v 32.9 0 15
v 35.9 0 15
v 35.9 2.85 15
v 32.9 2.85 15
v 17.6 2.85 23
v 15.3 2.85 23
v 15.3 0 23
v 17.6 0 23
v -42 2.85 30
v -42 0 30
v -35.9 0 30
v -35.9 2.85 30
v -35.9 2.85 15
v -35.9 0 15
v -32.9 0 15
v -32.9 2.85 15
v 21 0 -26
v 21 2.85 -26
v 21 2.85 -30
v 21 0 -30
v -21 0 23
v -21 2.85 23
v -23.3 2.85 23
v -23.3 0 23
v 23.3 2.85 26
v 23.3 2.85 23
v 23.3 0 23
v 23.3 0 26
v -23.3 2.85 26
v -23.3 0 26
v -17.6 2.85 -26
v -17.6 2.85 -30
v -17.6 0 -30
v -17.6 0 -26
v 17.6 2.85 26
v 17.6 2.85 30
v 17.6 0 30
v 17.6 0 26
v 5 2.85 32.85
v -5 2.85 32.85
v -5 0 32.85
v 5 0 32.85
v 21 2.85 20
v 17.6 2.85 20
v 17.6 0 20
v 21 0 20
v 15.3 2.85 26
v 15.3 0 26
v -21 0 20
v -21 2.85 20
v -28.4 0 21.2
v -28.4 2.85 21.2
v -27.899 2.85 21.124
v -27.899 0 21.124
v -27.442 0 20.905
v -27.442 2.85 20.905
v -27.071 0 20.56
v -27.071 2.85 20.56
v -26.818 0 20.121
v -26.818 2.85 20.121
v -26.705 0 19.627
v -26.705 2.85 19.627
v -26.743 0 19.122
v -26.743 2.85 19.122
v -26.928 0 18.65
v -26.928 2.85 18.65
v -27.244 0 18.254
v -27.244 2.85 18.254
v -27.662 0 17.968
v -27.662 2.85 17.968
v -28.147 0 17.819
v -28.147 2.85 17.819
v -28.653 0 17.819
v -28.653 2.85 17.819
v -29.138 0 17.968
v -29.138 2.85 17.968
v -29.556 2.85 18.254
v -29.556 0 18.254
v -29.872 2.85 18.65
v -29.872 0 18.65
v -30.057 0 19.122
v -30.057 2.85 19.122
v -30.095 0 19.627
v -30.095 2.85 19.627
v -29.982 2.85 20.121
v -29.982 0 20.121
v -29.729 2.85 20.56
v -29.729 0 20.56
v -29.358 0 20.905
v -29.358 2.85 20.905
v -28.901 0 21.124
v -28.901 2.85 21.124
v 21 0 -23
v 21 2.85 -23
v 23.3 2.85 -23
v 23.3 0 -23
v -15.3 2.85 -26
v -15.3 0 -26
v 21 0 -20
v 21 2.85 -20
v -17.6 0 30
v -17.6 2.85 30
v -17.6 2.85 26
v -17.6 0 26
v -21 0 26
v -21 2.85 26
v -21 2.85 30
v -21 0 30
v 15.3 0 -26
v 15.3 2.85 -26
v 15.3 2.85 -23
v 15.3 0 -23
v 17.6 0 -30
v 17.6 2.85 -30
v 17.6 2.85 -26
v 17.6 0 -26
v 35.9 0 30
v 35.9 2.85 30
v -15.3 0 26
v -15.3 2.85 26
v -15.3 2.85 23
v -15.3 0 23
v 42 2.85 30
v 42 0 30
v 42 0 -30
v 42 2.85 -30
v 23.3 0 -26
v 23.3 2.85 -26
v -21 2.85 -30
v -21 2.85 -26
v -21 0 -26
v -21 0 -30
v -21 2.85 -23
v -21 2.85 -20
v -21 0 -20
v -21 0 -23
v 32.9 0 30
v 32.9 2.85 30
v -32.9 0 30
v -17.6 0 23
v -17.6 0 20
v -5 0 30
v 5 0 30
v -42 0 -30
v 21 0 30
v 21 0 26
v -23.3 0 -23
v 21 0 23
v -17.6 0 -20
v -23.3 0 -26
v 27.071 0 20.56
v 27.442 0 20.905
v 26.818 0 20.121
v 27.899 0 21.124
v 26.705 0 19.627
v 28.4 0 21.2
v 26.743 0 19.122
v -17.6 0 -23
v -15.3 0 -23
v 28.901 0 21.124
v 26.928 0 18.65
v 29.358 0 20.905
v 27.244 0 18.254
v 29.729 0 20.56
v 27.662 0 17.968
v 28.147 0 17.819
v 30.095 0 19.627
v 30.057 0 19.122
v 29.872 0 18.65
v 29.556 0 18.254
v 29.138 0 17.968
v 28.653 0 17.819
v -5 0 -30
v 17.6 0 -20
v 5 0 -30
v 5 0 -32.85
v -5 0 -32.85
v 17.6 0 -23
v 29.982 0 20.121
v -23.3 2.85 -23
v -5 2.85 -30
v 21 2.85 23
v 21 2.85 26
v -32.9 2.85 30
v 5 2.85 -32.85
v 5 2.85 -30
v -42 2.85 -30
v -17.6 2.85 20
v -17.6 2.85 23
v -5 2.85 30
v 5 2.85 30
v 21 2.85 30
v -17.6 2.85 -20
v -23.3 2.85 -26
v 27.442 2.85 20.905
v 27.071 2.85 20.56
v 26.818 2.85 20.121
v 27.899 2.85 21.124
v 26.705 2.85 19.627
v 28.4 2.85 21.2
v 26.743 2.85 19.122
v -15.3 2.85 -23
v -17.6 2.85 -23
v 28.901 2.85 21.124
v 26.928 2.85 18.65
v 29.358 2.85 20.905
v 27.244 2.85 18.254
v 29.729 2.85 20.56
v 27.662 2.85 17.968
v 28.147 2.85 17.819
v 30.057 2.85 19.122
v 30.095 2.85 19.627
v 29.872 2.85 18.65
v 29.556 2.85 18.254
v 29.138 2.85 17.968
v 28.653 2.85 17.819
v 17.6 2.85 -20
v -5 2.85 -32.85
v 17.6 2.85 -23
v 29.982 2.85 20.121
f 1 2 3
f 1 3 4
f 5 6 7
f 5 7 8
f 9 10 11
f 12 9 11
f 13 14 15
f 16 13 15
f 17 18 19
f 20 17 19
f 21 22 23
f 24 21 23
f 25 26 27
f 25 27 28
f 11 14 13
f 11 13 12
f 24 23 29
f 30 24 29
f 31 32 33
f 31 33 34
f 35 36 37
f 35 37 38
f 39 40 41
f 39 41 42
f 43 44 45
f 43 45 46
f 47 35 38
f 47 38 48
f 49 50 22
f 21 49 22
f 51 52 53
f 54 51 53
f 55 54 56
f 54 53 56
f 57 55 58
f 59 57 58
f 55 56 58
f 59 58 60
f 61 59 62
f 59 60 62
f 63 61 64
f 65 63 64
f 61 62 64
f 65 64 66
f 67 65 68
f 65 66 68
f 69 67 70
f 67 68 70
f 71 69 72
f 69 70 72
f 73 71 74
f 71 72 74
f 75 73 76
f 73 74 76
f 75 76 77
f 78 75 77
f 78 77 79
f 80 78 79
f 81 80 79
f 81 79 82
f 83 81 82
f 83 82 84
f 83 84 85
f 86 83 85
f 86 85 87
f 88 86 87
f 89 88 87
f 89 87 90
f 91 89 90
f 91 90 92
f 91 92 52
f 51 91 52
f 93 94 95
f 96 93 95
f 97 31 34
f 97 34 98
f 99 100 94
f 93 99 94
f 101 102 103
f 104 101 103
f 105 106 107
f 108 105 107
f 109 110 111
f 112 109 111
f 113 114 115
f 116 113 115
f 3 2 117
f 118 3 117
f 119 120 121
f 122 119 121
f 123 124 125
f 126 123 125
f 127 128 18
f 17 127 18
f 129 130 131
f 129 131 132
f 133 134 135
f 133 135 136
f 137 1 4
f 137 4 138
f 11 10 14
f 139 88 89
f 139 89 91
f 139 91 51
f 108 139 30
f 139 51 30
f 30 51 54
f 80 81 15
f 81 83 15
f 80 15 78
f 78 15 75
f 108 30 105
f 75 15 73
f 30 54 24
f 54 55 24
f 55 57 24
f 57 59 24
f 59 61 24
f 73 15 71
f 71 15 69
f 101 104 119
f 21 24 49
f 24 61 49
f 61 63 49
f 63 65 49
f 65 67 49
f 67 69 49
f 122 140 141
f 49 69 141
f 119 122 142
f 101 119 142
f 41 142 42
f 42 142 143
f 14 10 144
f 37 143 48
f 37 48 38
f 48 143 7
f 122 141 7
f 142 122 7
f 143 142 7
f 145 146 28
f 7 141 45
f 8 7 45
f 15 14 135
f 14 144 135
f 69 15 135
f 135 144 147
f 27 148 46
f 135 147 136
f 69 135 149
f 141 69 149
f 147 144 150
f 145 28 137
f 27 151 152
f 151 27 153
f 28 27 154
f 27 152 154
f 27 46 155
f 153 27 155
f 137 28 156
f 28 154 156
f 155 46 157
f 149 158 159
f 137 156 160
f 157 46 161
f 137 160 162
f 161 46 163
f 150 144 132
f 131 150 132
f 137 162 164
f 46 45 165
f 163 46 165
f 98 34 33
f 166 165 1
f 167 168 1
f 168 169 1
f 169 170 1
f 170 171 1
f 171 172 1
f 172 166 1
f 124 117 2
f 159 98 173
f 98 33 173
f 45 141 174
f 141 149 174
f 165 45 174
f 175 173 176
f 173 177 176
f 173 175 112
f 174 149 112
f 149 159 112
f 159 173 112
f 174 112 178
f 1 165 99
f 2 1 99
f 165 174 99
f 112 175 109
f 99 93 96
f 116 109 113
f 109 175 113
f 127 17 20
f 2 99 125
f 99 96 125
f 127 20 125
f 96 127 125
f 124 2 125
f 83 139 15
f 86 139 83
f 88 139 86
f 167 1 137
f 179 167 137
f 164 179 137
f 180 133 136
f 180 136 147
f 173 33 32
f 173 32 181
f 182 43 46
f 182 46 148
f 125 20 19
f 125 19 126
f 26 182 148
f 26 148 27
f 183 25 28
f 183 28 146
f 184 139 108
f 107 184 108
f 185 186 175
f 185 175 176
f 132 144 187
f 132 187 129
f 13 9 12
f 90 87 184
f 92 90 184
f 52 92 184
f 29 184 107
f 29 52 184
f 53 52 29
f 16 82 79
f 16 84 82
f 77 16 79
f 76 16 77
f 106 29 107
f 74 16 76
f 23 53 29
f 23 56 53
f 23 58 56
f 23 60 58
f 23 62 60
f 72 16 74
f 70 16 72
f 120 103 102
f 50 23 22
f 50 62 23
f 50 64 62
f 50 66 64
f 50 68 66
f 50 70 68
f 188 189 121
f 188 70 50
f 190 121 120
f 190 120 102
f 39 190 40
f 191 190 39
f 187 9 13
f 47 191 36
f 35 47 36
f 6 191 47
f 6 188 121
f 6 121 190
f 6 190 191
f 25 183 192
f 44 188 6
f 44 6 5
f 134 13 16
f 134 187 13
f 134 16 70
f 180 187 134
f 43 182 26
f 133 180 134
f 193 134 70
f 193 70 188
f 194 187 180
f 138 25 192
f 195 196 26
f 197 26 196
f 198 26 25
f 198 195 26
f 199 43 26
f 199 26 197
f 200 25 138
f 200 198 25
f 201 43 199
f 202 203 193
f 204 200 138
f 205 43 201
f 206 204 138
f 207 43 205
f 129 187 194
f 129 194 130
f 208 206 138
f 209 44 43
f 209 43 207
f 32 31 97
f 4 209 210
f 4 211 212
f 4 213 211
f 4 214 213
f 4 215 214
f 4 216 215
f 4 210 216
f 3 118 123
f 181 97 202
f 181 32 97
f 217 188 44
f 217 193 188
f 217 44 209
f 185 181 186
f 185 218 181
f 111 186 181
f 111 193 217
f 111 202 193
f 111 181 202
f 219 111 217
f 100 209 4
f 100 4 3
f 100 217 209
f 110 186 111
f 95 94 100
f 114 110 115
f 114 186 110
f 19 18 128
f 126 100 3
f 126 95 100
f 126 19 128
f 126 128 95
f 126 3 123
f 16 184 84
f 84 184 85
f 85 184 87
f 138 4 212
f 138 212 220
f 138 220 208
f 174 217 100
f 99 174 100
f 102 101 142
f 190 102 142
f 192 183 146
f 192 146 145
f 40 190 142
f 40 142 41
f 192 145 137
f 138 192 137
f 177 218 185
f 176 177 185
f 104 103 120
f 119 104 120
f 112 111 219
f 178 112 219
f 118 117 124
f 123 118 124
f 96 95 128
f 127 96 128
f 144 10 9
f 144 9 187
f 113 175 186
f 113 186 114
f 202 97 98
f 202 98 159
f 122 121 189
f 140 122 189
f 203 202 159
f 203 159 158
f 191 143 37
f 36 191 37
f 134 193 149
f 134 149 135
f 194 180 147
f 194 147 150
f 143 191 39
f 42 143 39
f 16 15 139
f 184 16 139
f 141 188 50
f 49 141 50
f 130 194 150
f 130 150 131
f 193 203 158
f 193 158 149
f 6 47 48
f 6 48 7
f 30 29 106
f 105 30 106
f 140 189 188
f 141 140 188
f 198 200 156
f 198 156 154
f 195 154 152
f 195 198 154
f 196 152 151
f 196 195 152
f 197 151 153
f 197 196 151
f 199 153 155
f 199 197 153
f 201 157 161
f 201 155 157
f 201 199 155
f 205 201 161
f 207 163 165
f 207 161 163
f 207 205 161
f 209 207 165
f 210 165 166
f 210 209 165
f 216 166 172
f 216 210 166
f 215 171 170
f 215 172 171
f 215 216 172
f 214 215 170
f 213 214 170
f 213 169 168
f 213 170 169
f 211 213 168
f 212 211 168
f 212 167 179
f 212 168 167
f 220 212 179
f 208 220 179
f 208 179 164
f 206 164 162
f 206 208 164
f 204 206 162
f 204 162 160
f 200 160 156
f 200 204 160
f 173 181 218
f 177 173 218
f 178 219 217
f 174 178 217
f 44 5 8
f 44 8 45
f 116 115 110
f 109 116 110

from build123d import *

# Parameters (mm, degrees)
SKETCH1_W            = 84
SKETCH1_H            = 60
BOSS_EXTRUDE1_DEPTH  = 2.85
SKETCH2_W            = 3
SKETCH2_H            = 15
CUT_EXTRUDE1_DEPTH   = 52.692576837
CUT_EXTRUDE2_DEPTH   = 52.692576837
SKETCH4_W            = 10
SKETCH4_H            = 2.85
BOSS_EXTRUDE2_DEPTH  = 2.85
MIRROR3_COPY_1_DEPTH = 52.692576837
SKETCH5_R            = 1.7
CUT_EXTRUDE3_DEPTH   = 6


with BuildPart() as part:
    # Sketch1 → Boss-Extrude1 (new body)
    with BuildSketch(Plane(origin=(0, 0, 0), x_dir=(1, 0, 0), z_dir=(0, 1, 0))):
        Rectangle(SKETCH1_W, SKETCH1_H)
    extrude(amount=BOSS_EXTRUDE1_DEPTH)

    # Sketch2 → Cut-Extrude1 (cut, through all)
    with BuildSketch(Plane.XZ):
        with Locations((-34.4, 22.5)):
            Rectangle(SKETCH2_W, SKETCH2_H)
    cut_extrude1 = extrude(amount=-CUT_EXTRUDE1_DEPTH, mode=Mode.SUBTRACT)

    # Mirror1: Cut-Extrude1 across plane
    add(cut_extrude1.mirror(Plane(origin=(0, 0, 0), x_dir=(0, 0, 1), z_dir=(1, 0, 0))), mode=Mode.SUBTRACT)

    # Sketch3 → Cut-Extrude2 (cut, through all)
    with BuildSketch(Plane(origin=(0, 2.85, 0), x_dir=(1, 0, 0), z_dir=(0, 1, 0))):
        Polygon((-23.3, 26), (-21, 26), (-21, 30), (-17.6, 30), (-17.6, 26), (-15.3, 26), (-15.3, 23), (-17.6, 23), (-17.6, 20), (-21, 20), (-21, 23), (-23.3, 23), align=None)
    cut_extrude2 = extrude(amount=-CUT_EXTRUDE2_DEPTH, mode=Mode.SUBTRACT)

    # Mirror2: Cut-Extrude2 across plane
    add(cut_extrude2.mirror(Plane(origin=(0, 0, 0), x_dir=(0, 0, 1), z_dir=(1, 0, 0))), mode=Mode.SUBTRACT)

    # Sketch4 → Boss-Extrude2 (add)
    with BuildSketch(Plane(origin=(0, 2.85, 0), x_dir=(1, 0, 0), z_dir=(0, 1, 0))):
        with Locations((0, 31.425)):
            Rectangle(SKETCH4_W, SKETCH4_H)
    boss_extrude2 = extrude(amount=-BOSS_EXTRUDE2_DEPTH)

    # Mirror3: Cut-Extrude2, Boss-Extrude2 across plane
    add(cut_extrude2.mirror(Plane.XY), mode=Mode.SUBTRACT)
    add(boss_extrude2.mirror(Plane.XY))

    # Mirror3 copy 1 sketch → Mirror3 copy 1 (cut, through all)
    with BuildSketch(Plane(origin=(0, 2.85, 0), x_dir=(-1, 0, 0), z_dir=(0, 1, 0))):
        Polygon((-23.3, 26), (-21, 26), (-21, 30), (-17.6, 30), (-17.6, 26), (-15.3, 26), (-15.3, 23), (-17.6, 23), (-17.6, 20), (-21, 20), (-21, 23), (-23.3, 23), align=None)
    extrude(amount=-MIRROR3_COPY_1_DEPTH, mode=Mode.SUBTRACT)

    # Sketch5 → Cut-Extrude3 (cut)
    with BuildSketch(Plane(origin=(0, 5.35, 32.85), x_dir=(1, 0, 0), z_dir=(0, 1, 0))):
        with Locations(Location((-28.4, 13.35, 0), (0, 0, 270))):
            Circle(SKETCH5_R)
    cut_extrude3 = extrude(amount=-CUT_EXTRUDE3_DEPTH, mode=Mode.SUBTRACT)

    # Mirror4: Cut-Extrude3 across plane
    add(cut_extrude3.mirror(Plane(origin=(0, 0, 0), x_dir=(0, 0, 1), z_dir=(1, 0, 0))), mode=Mode.SUBTRACT)


solid = part.part
